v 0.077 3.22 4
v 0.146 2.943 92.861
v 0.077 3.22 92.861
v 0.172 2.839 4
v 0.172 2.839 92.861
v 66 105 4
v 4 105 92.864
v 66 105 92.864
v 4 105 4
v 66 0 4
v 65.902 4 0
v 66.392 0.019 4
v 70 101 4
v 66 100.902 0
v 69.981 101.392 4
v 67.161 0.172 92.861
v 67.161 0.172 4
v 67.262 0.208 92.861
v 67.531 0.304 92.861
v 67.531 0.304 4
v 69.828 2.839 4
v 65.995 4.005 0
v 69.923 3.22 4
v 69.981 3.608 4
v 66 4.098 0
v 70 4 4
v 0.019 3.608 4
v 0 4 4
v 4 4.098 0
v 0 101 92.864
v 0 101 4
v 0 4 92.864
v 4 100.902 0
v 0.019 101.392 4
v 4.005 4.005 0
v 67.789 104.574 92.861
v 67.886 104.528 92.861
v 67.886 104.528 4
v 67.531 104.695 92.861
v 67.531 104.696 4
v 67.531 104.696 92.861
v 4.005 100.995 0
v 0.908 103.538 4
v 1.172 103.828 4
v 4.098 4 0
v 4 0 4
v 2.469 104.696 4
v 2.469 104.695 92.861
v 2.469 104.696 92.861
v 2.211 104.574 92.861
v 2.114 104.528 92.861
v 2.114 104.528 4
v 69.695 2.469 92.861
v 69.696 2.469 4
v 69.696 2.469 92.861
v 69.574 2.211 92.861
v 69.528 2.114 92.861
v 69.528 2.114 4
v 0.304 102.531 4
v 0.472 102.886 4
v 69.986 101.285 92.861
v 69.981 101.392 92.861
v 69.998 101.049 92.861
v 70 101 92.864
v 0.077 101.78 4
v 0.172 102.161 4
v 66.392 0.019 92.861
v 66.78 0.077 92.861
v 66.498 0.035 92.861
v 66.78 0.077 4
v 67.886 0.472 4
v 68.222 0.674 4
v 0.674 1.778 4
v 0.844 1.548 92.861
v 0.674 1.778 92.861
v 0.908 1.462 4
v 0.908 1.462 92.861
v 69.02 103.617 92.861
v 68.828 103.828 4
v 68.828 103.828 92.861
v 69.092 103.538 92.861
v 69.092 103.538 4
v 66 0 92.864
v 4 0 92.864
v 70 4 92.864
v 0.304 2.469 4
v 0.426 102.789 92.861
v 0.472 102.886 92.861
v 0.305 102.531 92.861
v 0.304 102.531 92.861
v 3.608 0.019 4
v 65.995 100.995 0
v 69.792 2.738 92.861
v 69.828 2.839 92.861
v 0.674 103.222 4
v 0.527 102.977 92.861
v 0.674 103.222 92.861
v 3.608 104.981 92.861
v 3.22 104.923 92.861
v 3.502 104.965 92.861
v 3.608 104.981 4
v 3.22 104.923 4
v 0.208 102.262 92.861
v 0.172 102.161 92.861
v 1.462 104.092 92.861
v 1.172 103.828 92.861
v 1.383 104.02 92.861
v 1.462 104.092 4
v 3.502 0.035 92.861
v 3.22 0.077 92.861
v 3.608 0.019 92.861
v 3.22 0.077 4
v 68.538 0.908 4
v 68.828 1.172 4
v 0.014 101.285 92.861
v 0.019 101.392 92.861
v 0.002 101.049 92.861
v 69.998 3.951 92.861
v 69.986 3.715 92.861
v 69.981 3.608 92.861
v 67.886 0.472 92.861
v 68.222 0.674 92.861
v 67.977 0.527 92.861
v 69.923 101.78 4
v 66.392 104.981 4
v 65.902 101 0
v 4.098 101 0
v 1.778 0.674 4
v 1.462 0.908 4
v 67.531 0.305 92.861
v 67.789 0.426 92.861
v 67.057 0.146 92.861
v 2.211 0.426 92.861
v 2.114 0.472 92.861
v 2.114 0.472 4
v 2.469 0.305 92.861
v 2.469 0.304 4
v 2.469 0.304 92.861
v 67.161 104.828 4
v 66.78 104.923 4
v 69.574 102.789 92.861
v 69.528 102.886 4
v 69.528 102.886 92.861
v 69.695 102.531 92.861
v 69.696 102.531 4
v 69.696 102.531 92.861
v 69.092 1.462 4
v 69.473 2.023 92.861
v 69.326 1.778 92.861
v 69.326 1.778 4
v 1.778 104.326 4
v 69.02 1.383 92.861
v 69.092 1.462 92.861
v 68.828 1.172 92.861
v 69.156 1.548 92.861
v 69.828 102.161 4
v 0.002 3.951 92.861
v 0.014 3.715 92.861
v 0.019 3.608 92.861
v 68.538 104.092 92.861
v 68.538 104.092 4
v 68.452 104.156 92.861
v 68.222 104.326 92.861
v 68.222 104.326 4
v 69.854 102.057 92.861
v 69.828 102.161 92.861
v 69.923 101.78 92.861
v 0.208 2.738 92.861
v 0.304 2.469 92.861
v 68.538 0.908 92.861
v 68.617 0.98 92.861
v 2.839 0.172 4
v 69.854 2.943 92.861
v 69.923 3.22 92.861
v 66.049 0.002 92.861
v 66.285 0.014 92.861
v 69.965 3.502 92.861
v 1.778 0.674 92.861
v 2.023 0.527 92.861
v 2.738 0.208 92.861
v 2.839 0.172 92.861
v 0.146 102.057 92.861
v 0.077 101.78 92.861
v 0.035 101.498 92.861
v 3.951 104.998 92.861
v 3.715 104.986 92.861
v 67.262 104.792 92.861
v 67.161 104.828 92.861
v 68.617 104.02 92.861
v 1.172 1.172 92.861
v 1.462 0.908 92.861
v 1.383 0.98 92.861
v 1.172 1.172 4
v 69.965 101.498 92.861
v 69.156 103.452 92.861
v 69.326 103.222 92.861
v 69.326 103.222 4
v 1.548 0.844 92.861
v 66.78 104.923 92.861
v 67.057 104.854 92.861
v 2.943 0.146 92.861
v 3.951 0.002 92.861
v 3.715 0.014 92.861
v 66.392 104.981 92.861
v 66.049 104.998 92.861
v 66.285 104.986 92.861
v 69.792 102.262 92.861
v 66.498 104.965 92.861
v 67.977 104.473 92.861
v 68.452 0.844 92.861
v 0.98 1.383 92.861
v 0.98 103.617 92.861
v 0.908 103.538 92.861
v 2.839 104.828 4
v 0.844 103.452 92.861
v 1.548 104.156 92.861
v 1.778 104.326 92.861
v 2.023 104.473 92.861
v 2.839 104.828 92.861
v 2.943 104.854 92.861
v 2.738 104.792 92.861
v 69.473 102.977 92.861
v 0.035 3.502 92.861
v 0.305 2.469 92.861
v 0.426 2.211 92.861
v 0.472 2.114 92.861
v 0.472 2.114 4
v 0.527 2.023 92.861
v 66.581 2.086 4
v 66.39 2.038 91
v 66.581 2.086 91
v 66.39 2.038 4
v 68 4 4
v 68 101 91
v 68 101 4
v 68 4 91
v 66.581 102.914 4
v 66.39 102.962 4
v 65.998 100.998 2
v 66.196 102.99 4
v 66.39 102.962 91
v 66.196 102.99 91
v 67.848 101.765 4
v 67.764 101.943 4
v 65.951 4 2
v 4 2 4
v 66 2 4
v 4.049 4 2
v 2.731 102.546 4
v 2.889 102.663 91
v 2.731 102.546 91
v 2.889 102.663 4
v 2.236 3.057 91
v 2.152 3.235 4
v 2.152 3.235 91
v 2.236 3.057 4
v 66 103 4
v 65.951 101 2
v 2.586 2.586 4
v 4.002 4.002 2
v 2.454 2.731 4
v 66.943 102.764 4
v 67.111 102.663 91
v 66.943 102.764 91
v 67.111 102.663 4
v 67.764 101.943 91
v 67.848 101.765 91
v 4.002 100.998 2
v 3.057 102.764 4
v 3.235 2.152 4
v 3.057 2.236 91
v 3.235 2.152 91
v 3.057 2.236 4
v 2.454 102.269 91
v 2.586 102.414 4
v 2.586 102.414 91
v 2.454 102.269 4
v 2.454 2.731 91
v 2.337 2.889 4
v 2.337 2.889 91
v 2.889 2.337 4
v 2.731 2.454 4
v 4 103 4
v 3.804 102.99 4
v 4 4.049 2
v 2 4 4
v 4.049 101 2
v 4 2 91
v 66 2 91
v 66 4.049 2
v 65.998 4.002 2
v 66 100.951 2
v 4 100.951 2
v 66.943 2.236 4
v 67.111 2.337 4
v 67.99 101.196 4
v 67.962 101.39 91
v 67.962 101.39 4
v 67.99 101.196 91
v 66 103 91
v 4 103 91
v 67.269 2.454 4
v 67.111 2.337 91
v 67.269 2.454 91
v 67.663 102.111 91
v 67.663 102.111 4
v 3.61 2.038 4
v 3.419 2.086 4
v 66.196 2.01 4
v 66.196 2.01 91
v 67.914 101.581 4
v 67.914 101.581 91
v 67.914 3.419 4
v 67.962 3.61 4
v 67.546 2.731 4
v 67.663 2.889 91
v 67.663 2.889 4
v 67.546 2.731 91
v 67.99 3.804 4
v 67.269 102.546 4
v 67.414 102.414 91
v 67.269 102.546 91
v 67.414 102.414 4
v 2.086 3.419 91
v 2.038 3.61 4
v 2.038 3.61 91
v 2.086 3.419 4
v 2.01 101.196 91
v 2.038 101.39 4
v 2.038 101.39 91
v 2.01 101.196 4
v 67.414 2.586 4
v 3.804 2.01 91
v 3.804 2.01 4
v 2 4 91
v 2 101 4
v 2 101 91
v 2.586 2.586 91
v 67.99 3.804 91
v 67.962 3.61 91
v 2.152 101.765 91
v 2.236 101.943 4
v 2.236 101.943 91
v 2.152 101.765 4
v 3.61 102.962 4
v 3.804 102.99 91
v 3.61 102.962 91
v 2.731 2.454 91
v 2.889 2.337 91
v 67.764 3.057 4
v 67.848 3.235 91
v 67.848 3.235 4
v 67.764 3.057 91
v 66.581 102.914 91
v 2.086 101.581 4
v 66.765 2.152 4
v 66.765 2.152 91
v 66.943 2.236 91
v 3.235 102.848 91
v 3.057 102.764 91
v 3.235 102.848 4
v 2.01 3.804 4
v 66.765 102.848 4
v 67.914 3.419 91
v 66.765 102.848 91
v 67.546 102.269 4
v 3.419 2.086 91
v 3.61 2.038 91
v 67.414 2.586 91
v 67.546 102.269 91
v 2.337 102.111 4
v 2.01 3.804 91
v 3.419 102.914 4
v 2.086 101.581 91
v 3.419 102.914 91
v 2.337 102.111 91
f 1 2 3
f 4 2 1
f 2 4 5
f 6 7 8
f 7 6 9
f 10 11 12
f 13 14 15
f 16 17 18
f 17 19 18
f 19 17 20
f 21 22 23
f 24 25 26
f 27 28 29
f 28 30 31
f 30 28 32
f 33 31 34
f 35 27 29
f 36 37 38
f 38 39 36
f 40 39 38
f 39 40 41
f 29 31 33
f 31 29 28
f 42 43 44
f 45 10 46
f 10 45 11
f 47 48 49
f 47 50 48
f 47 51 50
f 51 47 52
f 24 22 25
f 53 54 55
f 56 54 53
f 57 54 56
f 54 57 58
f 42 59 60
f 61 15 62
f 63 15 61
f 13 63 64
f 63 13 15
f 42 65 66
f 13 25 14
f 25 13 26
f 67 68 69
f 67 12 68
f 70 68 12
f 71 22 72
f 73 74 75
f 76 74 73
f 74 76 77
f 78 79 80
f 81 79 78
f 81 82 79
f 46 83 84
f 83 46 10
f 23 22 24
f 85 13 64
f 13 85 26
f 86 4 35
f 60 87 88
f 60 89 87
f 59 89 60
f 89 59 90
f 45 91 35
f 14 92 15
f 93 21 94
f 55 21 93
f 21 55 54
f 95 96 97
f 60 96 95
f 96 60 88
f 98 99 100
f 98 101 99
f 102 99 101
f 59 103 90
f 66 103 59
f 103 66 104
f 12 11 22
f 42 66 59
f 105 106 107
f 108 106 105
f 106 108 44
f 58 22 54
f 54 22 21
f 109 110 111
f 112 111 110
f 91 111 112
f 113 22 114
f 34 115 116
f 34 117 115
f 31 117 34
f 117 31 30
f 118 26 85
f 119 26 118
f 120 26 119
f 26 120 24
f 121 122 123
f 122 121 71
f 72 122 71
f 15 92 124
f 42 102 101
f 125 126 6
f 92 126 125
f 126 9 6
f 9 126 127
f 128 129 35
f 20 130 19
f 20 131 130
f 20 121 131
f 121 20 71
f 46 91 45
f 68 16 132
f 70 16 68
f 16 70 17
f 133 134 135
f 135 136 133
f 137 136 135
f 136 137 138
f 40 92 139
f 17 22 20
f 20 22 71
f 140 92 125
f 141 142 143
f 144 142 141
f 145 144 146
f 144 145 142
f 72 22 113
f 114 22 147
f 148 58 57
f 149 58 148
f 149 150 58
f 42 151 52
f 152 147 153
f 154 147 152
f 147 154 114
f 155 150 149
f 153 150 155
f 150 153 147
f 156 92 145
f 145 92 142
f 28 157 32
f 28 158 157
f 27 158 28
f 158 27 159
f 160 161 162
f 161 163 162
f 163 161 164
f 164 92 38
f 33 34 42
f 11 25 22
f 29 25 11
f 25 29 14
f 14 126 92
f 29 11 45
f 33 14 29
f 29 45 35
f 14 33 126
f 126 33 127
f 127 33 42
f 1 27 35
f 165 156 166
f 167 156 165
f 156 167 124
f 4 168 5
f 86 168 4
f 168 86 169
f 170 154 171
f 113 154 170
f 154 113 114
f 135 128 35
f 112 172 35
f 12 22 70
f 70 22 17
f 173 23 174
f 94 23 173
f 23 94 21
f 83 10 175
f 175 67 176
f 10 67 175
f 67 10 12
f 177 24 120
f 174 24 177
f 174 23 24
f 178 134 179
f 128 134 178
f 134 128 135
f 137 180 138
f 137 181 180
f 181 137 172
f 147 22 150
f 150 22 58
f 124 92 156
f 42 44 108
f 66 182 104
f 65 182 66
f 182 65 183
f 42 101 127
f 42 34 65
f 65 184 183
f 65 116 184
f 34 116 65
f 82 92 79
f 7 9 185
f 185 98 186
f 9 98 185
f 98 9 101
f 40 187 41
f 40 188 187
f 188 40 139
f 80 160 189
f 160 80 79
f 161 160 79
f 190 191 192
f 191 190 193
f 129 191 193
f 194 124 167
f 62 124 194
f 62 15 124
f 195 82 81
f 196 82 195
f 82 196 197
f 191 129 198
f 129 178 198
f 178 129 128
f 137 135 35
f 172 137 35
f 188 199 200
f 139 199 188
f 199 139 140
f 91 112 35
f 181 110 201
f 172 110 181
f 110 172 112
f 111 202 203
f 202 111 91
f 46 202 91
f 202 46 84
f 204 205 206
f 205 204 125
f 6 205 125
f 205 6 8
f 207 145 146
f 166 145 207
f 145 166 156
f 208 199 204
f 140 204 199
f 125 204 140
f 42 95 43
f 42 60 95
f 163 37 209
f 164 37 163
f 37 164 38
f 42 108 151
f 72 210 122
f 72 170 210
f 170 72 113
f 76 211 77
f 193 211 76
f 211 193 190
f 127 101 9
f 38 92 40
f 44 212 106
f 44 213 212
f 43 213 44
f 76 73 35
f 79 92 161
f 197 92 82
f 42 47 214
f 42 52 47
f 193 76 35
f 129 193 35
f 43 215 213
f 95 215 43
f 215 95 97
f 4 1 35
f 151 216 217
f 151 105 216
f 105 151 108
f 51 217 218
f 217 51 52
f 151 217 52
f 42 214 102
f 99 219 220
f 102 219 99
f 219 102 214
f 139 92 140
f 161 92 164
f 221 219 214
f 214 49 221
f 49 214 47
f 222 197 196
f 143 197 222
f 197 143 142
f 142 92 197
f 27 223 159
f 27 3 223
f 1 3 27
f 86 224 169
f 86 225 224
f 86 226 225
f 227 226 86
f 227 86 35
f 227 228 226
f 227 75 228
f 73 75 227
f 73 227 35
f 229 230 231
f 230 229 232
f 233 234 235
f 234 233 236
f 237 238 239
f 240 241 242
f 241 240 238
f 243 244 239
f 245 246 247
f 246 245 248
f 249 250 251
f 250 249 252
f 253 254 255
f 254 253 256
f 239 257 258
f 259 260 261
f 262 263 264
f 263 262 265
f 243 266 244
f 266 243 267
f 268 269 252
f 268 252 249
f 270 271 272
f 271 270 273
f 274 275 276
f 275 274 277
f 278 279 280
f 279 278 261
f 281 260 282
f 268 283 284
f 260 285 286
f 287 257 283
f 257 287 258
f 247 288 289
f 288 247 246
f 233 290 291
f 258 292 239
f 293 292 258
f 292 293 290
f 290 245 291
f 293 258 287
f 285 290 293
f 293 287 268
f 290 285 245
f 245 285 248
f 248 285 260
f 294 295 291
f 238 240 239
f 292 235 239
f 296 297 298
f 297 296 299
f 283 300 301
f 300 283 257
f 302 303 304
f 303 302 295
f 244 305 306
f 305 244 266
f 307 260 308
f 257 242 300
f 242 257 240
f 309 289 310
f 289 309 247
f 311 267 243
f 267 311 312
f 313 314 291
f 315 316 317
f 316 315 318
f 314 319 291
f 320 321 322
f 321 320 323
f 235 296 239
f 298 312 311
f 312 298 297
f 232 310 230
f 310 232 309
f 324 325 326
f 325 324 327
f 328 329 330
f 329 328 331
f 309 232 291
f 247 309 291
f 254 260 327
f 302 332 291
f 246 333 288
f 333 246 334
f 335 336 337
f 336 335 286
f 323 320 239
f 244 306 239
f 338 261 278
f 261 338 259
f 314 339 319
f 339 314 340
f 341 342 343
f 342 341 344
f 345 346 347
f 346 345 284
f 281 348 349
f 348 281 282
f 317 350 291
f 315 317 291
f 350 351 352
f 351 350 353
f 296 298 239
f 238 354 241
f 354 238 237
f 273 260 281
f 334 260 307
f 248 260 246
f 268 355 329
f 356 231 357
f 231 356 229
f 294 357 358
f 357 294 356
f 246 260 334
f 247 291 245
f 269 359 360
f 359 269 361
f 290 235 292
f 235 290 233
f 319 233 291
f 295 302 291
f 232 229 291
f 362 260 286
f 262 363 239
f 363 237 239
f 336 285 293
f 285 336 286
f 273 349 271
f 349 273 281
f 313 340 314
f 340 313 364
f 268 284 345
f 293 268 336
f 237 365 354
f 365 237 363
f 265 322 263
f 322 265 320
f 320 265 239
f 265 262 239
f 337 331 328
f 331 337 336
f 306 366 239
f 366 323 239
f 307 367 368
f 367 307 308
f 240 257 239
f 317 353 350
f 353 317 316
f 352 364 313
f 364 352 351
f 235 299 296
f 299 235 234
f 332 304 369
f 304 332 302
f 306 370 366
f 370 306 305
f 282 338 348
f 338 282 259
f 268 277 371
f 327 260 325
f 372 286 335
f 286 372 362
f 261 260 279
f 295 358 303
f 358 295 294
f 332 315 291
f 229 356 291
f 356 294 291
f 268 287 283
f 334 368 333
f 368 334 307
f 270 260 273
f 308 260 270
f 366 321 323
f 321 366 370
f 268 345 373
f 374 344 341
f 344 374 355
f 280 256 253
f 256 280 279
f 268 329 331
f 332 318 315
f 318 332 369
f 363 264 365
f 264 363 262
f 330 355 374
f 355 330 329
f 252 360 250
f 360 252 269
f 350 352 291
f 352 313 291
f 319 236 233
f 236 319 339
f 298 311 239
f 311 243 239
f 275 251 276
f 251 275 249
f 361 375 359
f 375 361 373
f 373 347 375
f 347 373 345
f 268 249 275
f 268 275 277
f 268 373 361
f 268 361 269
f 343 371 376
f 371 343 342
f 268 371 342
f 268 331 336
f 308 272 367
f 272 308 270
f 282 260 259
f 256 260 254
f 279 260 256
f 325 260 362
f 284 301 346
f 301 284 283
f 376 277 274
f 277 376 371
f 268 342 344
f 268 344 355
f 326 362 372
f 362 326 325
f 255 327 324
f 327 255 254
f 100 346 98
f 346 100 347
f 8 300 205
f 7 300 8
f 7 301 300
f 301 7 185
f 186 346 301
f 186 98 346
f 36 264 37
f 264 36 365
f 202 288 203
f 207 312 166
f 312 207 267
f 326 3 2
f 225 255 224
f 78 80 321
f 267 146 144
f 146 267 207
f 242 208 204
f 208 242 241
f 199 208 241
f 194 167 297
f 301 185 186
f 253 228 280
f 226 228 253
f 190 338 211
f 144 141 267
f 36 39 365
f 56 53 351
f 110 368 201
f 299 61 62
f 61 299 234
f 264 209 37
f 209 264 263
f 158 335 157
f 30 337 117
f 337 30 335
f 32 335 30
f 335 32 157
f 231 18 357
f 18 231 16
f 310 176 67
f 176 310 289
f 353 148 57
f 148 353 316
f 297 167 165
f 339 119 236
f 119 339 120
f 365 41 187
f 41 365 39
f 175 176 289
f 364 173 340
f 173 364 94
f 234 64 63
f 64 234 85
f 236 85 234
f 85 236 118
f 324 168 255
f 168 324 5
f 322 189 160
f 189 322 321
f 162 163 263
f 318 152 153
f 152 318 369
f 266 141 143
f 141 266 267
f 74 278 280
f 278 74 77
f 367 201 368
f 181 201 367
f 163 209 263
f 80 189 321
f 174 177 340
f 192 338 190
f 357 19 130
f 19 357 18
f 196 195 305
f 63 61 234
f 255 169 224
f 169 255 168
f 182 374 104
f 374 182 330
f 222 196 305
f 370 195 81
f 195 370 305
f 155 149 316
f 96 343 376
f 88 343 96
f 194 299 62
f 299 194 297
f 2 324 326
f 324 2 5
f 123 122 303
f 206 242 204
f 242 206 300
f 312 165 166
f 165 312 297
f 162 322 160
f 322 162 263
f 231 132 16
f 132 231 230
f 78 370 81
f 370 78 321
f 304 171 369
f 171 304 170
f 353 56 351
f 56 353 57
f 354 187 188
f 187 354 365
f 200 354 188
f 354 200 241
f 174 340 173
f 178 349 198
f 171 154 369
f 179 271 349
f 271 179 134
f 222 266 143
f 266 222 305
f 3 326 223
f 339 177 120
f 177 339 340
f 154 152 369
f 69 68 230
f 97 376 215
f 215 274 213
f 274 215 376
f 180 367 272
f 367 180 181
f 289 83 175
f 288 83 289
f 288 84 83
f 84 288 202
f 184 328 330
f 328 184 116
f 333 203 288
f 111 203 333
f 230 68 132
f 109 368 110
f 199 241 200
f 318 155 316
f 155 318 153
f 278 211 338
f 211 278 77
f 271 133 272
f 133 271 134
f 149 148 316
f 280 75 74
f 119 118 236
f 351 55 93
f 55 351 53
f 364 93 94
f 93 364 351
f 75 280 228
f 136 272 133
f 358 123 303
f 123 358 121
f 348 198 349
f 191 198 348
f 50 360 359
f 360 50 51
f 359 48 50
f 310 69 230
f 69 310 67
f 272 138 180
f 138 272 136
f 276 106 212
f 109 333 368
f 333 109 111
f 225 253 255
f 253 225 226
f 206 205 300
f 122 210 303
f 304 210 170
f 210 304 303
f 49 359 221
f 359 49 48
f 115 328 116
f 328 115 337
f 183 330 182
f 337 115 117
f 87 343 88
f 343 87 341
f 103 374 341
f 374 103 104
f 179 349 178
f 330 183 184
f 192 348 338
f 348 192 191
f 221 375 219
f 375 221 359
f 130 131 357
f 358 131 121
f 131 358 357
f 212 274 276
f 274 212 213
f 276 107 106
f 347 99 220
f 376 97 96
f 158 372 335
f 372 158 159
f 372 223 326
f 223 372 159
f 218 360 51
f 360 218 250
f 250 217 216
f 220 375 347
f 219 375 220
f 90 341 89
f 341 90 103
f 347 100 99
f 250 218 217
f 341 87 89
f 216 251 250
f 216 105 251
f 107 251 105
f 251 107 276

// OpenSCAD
// Drawer Insert Box
// Optimized for support-free 3D printing and vertical stacking

// --- Parameters ---
width = 70;
depth = 105;
height = 95;
wall_thickness = 2;
corner_radius = 4;

// Visual Settings
transparency = 0.5;
color_outer_base = "DeepSkyBlue"; // Lighter than RoyalBlue
color_outer_walls = "MediumSeaGreen"; // Lighter than SeaGreen
color_inner_base = "HotPink"; // Lighter/Brighter than Tomato
color_inner_void = "Gold"; // Lighter than Goldenrod
color_inner_rim = "Orchid"; // Lighter than MediumPurple

// Chamfer settings for stacking and printability
// A 45-degree chamfer allows printing without supports.
chamfer_size = 4; 
stacking_clearance = 0.4; // Clearance between stacked boxes

// Precision
$fn = 64;

// --- Modules ---

module rounded_rect_profile(w, d, r) {
    translate([r, r, 0])
    minkowski() {
        square([w - 2*r, d - 2*r]);
        circle(r);
    }
}

module box_outer_shape() {
    union() {
        color(color_outer_base, transparency)
        hull() {
            // Bottom footprint (shrunken for chamfer)
            linear_extrude(0.1)
                offset(delta = -chamfer_size)
                rounded_rect_profile(width, depth, corner_radius);
            
            // Start of main walls
            translate([0, 0, chamfer_size])
            linear_extrude(0.1)
                rounded_rect_profile(width, depth, corner_radius);
        }
        
        // Main vertical walls
        color(color_outer_walls, transparency)
        translate([0, 0, chamfer_size])
        linear_extrude(height - chamfer_size)
            rounded_rect_profile(width, depth, corner_radius);
    }
}

module box_inner_cutout() {
    inner_w = width - 2 * wall_thickness;
    inner_d = depth - 2 * wall_thickness;
    inner_r = max(0.1, corner_radius - wall_thickness);
    
    // Calculate how much the outer chamfer "eats" into the wall thickness zone
    // and create a matching inner chamfer to maintain constant wall thickness.
    inner_chamfer_height = max(0, chamfer_size - wall_thickness);

    translate([wall_thickness, wall_thickness, wall_thickness]) {
        union() {
            // 1. Bottom Inner Chamfer (Structural reinforcement)
            if (inner_chamfer_height > 0) {
                color(color_inner_base, transparency)
                hull() {
                    // Bottom of the void (narrower to match outer slope)
                    linear_extrude(0.1)
                        offset(delta = -inner_chamfer_height)
                        rounded_rect_profile(inner_w, inner_d, inner_r);
                    
                    // Transition to full inner width
                    translate([0, 0, inner_chamfer_height])
                    linear_extrude(0.1)
                        rounded_rect_profile(inner_w, inner_d, inner_r);
                }
            }

            // 2. Main hollow volume
            color(color_inner_void, transparency)
            translate([0, 0, inner_chamfer_height])
            linear_extrude(height)
                rounded_rect_profile(inner_w, inner_d, inner_r);
                
            // 3. Top stacking rim (inverted chamfer)
            color(color_inner_rim, transparency)
            translate([0, 0, height - wall_thickness - chamfer_size])
            hull() {
                linear_extrude(0.1)
                    rounded_rect_profile(inner_w, inner_d, inner_r);
                    
                translate([0, 0, chamfer_size + 0.1])
                linear_extrude(0.1)
                    offset(delta = chamfer_size + stacking_clearance)
                    rounded_rect_profile(inner_w, inner_d, inner_r);
            }
        }
    }
}

// --- Final Assembly ---
difference() {
    box_outer_shape();
    box_inner_cutout();
}
